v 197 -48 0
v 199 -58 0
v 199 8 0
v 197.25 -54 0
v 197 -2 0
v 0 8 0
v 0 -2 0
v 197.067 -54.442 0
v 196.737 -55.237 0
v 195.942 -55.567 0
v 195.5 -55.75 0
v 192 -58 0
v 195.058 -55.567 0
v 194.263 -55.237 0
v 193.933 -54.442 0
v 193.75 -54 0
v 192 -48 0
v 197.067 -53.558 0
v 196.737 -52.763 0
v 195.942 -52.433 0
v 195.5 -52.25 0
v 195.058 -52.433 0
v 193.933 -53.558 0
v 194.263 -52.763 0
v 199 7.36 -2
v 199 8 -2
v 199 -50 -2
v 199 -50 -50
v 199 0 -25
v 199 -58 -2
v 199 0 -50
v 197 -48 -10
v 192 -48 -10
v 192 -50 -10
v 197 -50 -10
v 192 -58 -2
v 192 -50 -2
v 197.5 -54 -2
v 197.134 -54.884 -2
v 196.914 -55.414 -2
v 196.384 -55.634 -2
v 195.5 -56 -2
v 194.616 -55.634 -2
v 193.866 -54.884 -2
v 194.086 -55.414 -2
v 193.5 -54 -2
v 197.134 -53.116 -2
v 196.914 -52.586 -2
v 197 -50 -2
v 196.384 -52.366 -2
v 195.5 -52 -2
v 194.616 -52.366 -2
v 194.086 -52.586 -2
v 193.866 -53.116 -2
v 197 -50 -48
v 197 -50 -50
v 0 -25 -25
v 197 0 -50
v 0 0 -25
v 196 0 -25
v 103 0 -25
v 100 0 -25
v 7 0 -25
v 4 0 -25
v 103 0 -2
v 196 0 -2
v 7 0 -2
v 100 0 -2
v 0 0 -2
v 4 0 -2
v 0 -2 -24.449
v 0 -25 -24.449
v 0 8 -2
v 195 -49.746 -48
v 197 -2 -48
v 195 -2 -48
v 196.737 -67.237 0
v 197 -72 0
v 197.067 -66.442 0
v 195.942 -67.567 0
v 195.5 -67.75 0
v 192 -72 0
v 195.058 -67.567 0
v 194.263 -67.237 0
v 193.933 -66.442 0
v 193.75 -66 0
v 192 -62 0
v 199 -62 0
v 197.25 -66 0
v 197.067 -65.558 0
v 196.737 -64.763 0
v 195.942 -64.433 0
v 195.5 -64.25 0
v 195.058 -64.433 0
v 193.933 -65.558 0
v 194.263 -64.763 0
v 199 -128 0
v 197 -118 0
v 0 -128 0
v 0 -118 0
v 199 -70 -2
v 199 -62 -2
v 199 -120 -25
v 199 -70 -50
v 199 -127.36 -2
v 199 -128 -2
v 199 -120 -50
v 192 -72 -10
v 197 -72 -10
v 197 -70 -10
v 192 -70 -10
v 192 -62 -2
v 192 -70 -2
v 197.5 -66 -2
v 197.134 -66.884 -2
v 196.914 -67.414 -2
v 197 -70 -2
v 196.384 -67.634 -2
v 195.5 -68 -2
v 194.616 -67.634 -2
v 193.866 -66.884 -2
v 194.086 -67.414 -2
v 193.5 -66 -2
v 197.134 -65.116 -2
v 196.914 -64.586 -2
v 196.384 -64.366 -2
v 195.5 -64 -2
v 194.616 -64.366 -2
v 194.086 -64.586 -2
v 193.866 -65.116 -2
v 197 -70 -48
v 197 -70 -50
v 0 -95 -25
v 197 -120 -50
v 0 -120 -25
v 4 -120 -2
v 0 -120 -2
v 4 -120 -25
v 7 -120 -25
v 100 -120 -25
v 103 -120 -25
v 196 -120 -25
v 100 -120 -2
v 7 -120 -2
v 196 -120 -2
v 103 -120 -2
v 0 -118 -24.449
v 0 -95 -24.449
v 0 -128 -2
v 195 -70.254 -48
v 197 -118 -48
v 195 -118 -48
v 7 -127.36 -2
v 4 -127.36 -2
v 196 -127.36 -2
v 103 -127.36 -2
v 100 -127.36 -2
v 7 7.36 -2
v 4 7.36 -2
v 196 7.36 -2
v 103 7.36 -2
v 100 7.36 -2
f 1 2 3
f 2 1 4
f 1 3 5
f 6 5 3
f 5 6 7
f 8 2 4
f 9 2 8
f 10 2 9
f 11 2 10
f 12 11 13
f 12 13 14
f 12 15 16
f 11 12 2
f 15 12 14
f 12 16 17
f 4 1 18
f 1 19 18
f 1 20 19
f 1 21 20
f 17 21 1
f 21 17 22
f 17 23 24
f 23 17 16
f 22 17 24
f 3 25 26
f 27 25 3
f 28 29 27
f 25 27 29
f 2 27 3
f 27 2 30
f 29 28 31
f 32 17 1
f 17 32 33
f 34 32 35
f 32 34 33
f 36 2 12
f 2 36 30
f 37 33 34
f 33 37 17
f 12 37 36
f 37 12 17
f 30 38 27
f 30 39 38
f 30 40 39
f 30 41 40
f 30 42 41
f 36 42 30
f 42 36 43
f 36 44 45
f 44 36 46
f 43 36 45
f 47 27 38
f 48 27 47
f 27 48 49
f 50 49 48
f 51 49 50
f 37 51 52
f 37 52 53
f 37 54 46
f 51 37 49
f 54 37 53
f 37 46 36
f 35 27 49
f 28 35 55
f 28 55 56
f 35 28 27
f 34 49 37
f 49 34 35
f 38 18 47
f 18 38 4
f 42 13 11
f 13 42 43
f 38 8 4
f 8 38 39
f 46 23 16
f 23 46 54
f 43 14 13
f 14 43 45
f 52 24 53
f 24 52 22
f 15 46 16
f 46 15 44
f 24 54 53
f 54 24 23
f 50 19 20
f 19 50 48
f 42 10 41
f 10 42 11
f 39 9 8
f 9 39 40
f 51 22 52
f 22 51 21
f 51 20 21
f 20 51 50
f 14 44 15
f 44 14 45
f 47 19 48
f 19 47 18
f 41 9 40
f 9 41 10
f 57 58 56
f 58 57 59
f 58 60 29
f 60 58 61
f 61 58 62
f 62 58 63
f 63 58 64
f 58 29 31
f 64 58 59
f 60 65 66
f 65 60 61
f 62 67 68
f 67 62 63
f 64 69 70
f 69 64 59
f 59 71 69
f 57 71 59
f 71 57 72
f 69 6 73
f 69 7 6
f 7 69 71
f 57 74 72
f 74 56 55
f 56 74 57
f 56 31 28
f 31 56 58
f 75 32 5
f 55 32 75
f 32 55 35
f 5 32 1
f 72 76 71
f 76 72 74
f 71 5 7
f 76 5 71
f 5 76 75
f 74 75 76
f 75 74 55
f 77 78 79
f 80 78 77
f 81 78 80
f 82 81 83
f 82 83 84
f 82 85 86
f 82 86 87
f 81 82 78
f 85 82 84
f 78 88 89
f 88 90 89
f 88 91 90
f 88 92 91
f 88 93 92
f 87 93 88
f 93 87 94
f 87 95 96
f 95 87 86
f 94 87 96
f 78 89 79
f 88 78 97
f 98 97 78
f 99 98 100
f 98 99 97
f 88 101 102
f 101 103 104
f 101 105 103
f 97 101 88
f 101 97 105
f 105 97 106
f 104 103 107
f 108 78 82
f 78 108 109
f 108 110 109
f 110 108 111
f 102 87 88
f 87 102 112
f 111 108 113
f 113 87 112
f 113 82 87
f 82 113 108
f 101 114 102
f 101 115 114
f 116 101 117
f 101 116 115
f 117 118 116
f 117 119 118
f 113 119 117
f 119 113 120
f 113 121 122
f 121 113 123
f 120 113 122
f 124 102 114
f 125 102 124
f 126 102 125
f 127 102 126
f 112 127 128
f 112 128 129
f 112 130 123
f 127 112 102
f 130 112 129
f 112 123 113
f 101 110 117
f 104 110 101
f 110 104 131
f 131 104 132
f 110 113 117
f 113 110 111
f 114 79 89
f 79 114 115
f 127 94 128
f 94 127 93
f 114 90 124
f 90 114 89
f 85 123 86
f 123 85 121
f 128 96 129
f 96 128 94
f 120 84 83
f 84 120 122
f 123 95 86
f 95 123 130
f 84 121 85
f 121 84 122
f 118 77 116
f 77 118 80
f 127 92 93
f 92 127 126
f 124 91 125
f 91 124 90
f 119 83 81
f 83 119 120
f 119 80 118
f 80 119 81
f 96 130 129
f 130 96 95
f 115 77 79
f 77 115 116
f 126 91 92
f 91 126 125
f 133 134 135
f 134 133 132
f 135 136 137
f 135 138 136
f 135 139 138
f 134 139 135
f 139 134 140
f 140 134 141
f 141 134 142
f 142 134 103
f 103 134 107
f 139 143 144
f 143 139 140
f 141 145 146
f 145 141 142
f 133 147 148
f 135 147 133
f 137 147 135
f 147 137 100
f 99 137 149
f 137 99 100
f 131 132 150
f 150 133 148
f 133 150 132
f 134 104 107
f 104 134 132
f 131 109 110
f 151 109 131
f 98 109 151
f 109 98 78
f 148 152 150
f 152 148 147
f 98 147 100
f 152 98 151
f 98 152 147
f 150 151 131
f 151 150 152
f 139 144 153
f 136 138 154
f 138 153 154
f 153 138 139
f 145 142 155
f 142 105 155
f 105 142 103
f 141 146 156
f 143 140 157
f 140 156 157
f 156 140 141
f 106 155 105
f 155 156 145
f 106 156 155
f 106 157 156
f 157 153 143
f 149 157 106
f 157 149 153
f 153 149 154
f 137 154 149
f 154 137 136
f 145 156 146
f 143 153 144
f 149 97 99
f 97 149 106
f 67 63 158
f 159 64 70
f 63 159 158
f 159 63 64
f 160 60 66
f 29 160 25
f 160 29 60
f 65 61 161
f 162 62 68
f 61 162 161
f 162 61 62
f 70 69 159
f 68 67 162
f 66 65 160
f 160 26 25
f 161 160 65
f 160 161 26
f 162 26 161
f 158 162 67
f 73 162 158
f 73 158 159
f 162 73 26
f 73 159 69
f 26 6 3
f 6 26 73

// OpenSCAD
// make an upside down rack to hold a pot lid for under a cabinet.  Not on the side, but under. 

first_square=25;
end_square=50;
bar_length=197;

//!rotate_extrude($fn=10) rotate([0,90,0]) polygon(points=[[0,-2],[0,-10],[-first_square,-10]]);


module make_bar(bar_length=bar_length, first_square=25,end_square=50){
    color("green")
        

hull()
{

translate([0,0,first_square]) 
    rotate([0,90,0]) cube([first_square,first_square,2],center=false);
    

translate([bar_length,0,end_square]) 
    rotate([0,90,0]) cube([end_square,end_square,2],center=false);
   }


}





//make supports

module support_tri(){
translate([7,10,0]) rotate([0,-90,0])linear_extrude(height=3) polygon(points=[[0,-2],[0,-10],[-first_square,-10]]);}
    


//make L brackets

module L_braket(){
    difference()
{
    translate([0,0,20])make_bar(bar_length=5, first_square=10,end_square=10);
translate([-1,-2,18])make_bar(bar_length=8, first_square=10,end_square=10);
    translate([3.5,4,24])  cylinder(h=8,r1=2.5,r2=1.5);
}
}




// L_braket(); 
//translate([3.5,5,24])  cylinder(h=8,r1=2.5,r2=1.5);


//make object

translate([0,-120,0]) 
    mirror([0,1,0]){
color("blue") 
support_tri();
        translate([192,0,0]) support_tri();
        translate([192/2,0,0]) support_tri();
//translate([7,8,-30])rotate([0,0,180]) L_braket();
//        translate([bar_length/2,8,-30]) rotate([0,0,180]) L_braket();
//translate([bar_length-5,8,-30]) rotate([0,0,180]) L_braket();

color("orange") 

{
    translate([bar_length-5,-end_square-8,-30]) rotate([0,0,0]) L_braket();
    }
color ("green")
   translate([0,0,-2]) cube([bar_length+2,8,2]);
    
difference()
{
    rotate([180,0,0]) make_bar(first_square=first_square,end_square=end_square);
    translate([-12,-2,2]) rotate([180,0,0]) make_bar(bar_length=bar_length+10);

    
}



}

color("green")
support_tri();
        translate([192,0,0]) support_tri();
        translate([192/2,0,0]) support_tri();
//translate([7,8,-30])rotate([0,0,180]) L_braket();
//        translate([bar_length/2,8,-30]) rotate([0,0,180]) L_braket();
//translate([bar_length-5,8,-30]) rotate([0,0,180]) L_braket();

color("orange") 

{
    translate([bar_length-5,-end_square-8,-30]) rotate([0,0,0]) L_braket();
    }
translate([0,0,-2]) cube([bar_length+2,8,2]);
difference()
{
    rotate([180,0,0]) make_bar(first_square=first_square,end_square=end_square);
    translate([-12,-2,2]) rotate([180,0,0]) make_bar(bar_length=bar_length+10);

    
}
